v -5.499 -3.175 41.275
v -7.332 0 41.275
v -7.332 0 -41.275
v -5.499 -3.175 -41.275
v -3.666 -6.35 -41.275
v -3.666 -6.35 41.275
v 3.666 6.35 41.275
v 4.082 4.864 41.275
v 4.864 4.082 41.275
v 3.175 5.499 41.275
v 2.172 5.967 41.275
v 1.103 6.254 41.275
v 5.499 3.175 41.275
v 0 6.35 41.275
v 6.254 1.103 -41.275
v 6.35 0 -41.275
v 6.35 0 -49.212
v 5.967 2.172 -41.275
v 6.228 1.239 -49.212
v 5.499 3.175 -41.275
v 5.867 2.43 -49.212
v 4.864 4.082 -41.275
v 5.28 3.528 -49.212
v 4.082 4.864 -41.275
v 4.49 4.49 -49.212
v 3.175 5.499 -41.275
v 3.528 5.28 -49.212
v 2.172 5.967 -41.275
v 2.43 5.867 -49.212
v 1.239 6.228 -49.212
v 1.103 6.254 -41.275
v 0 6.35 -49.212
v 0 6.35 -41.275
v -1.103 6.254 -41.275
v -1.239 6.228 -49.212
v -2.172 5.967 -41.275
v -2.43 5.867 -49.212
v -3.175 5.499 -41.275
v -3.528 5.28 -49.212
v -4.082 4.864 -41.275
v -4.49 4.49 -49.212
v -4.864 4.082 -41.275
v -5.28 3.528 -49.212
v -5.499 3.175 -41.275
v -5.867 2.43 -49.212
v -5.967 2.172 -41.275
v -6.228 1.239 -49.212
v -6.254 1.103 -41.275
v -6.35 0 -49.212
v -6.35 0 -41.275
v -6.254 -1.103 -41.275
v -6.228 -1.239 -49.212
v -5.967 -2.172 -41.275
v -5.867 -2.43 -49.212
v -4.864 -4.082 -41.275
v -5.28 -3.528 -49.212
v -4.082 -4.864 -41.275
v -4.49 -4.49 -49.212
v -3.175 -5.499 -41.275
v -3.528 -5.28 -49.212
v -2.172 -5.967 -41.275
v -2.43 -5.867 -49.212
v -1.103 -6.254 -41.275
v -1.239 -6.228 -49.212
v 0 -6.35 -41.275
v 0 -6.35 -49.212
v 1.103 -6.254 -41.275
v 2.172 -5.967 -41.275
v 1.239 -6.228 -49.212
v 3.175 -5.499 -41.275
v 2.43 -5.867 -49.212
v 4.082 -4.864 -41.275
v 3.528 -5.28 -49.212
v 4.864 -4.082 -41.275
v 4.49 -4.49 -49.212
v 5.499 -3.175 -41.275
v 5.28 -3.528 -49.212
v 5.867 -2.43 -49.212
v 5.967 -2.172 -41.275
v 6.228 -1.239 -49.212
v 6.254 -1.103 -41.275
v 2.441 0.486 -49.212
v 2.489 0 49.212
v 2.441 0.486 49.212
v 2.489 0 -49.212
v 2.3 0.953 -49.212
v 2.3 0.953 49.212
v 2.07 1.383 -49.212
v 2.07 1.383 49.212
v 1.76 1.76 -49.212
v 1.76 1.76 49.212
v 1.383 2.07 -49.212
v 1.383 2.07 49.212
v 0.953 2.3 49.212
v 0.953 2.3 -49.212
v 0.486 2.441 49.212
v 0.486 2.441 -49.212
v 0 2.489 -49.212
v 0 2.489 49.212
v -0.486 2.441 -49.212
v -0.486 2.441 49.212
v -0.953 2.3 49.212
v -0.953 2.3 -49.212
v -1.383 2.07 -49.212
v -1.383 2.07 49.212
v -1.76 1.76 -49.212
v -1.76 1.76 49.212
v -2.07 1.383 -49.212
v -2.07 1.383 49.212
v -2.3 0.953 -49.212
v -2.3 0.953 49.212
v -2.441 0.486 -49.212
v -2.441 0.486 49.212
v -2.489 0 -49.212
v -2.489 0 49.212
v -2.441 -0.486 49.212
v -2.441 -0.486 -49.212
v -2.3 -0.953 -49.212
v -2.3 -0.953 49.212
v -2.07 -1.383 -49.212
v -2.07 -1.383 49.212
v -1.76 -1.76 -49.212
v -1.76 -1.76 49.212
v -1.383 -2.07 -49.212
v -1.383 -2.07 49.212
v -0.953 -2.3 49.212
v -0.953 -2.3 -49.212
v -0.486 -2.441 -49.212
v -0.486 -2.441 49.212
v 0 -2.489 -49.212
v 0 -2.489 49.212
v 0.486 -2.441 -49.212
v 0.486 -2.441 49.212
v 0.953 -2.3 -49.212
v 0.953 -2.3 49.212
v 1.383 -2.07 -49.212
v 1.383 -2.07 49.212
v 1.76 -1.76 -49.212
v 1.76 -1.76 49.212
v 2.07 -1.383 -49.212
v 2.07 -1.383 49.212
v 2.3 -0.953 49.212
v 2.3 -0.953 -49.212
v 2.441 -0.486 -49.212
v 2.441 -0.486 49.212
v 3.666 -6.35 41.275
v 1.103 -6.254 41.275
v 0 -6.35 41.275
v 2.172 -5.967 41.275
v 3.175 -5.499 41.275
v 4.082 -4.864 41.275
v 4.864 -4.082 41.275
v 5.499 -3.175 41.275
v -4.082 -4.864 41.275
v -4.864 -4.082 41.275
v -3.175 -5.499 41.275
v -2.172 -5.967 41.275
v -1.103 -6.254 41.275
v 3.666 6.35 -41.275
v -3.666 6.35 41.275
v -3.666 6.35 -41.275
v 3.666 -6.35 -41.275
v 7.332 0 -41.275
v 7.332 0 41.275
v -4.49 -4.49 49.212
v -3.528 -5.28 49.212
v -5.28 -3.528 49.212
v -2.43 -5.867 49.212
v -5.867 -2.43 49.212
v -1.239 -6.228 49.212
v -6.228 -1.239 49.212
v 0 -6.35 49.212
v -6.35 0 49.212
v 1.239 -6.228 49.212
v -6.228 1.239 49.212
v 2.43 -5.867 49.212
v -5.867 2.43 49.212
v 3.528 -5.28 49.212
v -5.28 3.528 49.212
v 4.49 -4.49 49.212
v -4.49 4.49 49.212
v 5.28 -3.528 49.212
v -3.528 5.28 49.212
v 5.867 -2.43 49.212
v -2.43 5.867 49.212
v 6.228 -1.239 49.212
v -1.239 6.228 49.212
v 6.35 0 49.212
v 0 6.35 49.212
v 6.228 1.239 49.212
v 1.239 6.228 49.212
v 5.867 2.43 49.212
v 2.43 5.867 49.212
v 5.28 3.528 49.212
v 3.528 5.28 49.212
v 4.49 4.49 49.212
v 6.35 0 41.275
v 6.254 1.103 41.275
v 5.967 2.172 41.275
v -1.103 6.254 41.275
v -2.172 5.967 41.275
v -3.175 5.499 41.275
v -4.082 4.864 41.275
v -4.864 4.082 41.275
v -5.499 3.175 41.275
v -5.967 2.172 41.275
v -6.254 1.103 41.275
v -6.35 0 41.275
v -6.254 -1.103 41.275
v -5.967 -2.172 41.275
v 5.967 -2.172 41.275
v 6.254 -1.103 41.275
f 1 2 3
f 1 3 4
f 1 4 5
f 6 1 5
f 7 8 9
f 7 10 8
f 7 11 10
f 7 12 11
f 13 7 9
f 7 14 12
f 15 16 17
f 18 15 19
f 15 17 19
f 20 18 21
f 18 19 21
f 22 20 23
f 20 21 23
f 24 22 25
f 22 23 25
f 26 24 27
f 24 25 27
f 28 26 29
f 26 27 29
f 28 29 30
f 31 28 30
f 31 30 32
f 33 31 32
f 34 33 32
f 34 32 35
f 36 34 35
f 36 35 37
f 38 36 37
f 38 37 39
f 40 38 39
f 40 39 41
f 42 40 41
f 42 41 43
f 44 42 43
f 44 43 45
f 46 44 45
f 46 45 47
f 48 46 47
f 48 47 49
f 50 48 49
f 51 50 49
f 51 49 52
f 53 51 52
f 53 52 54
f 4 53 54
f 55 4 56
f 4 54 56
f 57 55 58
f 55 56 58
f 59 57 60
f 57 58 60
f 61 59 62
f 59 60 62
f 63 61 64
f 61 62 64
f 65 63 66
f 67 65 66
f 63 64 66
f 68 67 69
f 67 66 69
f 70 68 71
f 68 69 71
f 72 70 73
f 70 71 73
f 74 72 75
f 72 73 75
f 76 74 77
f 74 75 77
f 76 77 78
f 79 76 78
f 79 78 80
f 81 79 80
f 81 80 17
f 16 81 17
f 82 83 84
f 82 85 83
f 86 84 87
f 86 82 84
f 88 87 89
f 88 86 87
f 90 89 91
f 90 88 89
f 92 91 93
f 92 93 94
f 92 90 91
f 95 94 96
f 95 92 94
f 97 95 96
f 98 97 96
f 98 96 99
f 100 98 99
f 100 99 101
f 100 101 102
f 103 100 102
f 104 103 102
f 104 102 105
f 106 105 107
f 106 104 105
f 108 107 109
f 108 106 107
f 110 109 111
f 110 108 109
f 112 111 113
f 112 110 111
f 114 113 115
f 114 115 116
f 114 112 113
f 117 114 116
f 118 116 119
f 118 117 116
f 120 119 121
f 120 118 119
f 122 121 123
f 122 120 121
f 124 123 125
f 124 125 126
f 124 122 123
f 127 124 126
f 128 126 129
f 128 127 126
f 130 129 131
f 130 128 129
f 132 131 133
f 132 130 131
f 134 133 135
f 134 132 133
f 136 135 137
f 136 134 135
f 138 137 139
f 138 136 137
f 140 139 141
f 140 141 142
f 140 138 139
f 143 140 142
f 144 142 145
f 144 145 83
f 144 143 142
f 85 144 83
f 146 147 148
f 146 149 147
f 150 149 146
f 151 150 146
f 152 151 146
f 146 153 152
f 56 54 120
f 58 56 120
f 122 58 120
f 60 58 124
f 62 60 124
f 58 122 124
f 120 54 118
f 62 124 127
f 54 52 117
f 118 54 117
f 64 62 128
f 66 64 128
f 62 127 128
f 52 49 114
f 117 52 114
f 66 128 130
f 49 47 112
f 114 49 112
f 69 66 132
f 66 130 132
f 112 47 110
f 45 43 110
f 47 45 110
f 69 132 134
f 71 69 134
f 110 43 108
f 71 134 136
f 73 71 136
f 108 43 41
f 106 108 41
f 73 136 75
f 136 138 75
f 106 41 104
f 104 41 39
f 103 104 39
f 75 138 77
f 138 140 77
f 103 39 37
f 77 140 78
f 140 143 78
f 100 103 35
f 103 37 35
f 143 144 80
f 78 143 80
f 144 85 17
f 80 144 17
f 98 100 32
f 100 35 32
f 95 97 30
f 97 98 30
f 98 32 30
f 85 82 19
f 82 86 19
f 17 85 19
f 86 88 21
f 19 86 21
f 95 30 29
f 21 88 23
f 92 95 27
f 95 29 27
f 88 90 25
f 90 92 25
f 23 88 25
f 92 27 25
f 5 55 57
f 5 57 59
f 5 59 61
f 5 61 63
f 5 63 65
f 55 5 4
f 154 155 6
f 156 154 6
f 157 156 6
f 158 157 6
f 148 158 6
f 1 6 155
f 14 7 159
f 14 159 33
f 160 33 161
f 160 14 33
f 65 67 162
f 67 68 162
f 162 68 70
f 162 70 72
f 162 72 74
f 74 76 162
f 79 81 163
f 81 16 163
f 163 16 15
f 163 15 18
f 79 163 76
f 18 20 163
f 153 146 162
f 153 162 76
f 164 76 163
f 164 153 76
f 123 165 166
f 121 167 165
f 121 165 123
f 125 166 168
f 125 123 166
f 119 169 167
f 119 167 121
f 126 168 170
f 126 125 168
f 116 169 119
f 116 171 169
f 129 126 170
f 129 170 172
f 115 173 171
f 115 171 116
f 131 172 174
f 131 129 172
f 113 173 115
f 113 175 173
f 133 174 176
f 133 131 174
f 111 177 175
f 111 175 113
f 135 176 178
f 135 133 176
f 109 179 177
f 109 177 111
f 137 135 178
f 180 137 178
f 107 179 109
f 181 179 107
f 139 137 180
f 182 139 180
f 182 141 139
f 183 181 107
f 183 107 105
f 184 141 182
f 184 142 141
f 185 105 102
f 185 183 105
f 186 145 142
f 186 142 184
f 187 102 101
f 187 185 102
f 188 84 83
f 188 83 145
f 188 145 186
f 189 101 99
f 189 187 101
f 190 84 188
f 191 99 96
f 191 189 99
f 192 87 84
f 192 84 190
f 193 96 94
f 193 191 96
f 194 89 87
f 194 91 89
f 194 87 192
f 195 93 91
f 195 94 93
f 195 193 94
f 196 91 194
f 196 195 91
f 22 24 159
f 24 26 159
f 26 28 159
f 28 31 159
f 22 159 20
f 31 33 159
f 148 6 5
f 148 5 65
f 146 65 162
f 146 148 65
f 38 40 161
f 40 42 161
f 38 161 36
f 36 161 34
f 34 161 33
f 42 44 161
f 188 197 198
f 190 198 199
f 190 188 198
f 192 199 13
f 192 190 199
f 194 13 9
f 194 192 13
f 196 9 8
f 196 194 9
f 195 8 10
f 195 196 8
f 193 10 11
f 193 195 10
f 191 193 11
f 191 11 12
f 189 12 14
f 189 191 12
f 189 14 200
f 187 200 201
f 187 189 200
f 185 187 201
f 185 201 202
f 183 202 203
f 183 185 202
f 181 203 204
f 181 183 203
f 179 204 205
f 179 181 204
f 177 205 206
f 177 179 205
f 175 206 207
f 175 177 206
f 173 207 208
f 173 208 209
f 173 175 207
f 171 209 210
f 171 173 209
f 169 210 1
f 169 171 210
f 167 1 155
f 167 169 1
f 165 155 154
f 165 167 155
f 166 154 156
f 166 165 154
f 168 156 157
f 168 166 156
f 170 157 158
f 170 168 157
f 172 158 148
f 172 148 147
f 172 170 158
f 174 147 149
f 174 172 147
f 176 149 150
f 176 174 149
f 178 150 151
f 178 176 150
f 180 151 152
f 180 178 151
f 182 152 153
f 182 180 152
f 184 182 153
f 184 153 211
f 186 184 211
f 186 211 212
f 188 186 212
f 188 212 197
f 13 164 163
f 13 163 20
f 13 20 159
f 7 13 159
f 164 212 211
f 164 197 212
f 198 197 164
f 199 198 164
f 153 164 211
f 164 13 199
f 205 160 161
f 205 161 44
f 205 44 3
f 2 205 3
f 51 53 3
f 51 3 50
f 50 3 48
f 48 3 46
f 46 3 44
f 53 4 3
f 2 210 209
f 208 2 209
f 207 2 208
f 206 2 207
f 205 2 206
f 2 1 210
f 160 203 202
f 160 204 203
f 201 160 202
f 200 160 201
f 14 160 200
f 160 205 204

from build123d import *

# Parameters (mm, degrees)
SKETCH1_R           = 2.4892
BOSS_EXTRUDE1_DEPTH = 49.2125
SKETCH2_OUTSIDE_W   = 36.728
SKETCH2_OUTSIDE_H   = 34.764
SKETCH2_OUTSIDE_R   = 6.35
CUT_EXTRUDE1_DEPTH  = 7.9375


with BuildPart() as part:
    # Sketch1 → Boss-Extrude1 (new, symmetric)
    with BuildSketch(Plane.XY):
        Polygon((3.666174209, 6.35), (-3.666174209, 6.35), (-7.332348419, 0), (-3.666174209, -6.35), (3.666174209, -6.35), (7.332348419, 0), align=None)
        Circle(SKETCH1_R, mode=Mode.SUBTRACT)
    extrude(amount=BOSS_EXTRUDE1_DEPTH, both=True)

    # Sketch2 outside → Cut-Extrude1 (cut)
    with BuildSketch(Plane.XY.offset(49.2125)):
        Rectangle(SKETCH2_OUTSIDE_W, SKETCH2_OUTSIDE_H)
        Circle(SKETCH2_OUTSIDE_R, mode=Mode.SUBTRACT)
    cut_extrude1 = extrude(amount=-CUT_EXTRUDE1_DEPTH, mode=Mode.SUBTRACT)

    # Mirror1: Cut-Extrude1 across plane
    add(cut_extrude1.mirror(Plane.XY), mode=Mode.SUBTRACT)


solid = part.part
